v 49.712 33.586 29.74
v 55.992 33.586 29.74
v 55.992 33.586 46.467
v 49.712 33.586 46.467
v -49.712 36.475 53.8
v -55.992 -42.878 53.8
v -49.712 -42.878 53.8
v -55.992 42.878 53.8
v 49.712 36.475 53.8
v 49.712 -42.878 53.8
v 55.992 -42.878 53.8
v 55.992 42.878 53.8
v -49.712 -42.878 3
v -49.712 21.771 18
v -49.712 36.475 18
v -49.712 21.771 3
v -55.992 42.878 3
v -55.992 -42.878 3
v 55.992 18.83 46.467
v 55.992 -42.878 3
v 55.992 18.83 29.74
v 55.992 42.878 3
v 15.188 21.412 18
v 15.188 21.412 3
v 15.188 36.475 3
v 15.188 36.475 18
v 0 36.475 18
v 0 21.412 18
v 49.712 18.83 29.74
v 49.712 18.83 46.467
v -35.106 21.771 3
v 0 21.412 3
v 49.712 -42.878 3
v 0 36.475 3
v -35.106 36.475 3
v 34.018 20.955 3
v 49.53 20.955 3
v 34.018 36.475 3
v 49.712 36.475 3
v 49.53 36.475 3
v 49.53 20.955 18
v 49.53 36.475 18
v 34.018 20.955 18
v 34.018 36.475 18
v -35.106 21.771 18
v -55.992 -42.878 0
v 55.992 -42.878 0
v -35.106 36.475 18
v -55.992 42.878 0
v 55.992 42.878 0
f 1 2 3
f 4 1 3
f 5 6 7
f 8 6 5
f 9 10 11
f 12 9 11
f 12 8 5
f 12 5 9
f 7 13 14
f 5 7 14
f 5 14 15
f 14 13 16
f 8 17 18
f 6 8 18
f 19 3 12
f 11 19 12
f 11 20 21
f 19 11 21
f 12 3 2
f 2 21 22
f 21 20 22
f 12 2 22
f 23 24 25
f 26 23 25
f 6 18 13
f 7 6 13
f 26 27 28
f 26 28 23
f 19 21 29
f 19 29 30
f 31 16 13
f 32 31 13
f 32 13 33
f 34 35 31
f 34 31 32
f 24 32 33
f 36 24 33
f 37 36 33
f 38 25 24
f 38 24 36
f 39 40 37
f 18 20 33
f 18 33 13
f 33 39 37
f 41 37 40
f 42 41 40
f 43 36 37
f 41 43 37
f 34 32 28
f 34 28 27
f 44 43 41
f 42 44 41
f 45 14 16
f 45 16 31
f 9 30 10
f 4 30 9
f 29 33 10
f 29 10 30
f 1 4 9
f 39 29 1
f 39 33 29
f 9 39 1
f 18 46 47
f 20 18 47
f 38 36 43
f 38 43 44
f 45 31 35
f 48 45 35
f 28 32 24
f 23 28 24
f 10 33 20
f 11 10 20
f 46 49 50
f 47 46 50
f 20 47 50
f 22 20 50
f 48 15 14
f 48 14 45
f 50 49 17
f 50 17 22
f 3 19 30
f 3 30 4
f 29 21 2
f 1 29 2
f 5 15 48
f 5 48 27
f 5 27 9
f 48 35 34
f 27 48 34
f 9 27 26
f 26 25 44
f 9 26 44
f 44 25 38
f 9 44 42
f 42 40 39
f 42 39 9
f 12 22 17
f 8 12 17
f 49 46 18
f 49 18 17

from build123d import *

# Parameters (mm, degrees)
F0_W      = 111.984528
F0_H      = 85.756578
F1_DEPTH  = 3
F2_W      = 6.280169
F2_H      = 6.403141
F2_W_2    = 99.42419
F2_H_2    = 79.353437
F3_DEPTH  = 50.8
F4_W      = 14.75576
F4_H      = 16.726847
F5_DEPTH  = 25.4
F6_W      = 15.188249
F6_H      = 15.062956
F7_DEPTH  = 15
F9_W      = 14.695715
F9_H      = 14.967857
F9_W_2    = 15.512146
F9_H_2    = 15.784284
F10_DEPTH = 15


with BuildPart() as f1:
    # F0 (on Top) → F1 (new body)
    with BuildSketch(Plane.XY):
        Rectangle(F0_W, F0_H)
    extrude(amount=F1_DEPTH)

    # F2 (on face) → F3 (join)
    with BuildSketch(Plane.XY.offset(3)):
        with Locations((-52.852179, 39.676718)):
            Rectangle(F2_W, F2_H)
        with Locations((0, 39.676718)):
            Rectangle(F2_W_2, F2_H)
        with Locations((-52.852179, -3.20157)):
            Rectangle(F2_W, F2_H_2)
        with Locations((52.852179, 39.676718)):
            Rectangle(F2_W, F2_H)
        with Locations((52.852179, -3.20157)):
            Rectangle(F2_W, F2_H_2)
    extrude(amount=F3_DEPTH)

    # F4 (on face) → F5 (cut)
    with BuildSketch(Plane.YZ.offset(55.992264)):
        with Locations((26.207732, 38.103093)):
            Rectangle(F4_W, F4_H)
    extrude(amount=-F5_DEPTH, mode=Mode.SUBTRACT)

    # F6 (on face) → F7 (join)
    with BuildSketch(Plane.XY.offset(3)):
        with Locations((7.594124, 28.94367)):
            Rectangle(F6_W, F6_H)
    extrude(amount=F7_DEPTH)

    # F9 (on face) → F10 (join)
    with BuildSketch(Plane.XY.offset(3)):
        with Locations((-42.454285, 29.255357)):
            Rectangle(F9_W, F9_H)
        with Locations((41.773926, 28.847144)):
            Rectangle(F9_W_2, F9_H_2)
    extrude(amount=F10_DEPTH)


solid = f1.part
